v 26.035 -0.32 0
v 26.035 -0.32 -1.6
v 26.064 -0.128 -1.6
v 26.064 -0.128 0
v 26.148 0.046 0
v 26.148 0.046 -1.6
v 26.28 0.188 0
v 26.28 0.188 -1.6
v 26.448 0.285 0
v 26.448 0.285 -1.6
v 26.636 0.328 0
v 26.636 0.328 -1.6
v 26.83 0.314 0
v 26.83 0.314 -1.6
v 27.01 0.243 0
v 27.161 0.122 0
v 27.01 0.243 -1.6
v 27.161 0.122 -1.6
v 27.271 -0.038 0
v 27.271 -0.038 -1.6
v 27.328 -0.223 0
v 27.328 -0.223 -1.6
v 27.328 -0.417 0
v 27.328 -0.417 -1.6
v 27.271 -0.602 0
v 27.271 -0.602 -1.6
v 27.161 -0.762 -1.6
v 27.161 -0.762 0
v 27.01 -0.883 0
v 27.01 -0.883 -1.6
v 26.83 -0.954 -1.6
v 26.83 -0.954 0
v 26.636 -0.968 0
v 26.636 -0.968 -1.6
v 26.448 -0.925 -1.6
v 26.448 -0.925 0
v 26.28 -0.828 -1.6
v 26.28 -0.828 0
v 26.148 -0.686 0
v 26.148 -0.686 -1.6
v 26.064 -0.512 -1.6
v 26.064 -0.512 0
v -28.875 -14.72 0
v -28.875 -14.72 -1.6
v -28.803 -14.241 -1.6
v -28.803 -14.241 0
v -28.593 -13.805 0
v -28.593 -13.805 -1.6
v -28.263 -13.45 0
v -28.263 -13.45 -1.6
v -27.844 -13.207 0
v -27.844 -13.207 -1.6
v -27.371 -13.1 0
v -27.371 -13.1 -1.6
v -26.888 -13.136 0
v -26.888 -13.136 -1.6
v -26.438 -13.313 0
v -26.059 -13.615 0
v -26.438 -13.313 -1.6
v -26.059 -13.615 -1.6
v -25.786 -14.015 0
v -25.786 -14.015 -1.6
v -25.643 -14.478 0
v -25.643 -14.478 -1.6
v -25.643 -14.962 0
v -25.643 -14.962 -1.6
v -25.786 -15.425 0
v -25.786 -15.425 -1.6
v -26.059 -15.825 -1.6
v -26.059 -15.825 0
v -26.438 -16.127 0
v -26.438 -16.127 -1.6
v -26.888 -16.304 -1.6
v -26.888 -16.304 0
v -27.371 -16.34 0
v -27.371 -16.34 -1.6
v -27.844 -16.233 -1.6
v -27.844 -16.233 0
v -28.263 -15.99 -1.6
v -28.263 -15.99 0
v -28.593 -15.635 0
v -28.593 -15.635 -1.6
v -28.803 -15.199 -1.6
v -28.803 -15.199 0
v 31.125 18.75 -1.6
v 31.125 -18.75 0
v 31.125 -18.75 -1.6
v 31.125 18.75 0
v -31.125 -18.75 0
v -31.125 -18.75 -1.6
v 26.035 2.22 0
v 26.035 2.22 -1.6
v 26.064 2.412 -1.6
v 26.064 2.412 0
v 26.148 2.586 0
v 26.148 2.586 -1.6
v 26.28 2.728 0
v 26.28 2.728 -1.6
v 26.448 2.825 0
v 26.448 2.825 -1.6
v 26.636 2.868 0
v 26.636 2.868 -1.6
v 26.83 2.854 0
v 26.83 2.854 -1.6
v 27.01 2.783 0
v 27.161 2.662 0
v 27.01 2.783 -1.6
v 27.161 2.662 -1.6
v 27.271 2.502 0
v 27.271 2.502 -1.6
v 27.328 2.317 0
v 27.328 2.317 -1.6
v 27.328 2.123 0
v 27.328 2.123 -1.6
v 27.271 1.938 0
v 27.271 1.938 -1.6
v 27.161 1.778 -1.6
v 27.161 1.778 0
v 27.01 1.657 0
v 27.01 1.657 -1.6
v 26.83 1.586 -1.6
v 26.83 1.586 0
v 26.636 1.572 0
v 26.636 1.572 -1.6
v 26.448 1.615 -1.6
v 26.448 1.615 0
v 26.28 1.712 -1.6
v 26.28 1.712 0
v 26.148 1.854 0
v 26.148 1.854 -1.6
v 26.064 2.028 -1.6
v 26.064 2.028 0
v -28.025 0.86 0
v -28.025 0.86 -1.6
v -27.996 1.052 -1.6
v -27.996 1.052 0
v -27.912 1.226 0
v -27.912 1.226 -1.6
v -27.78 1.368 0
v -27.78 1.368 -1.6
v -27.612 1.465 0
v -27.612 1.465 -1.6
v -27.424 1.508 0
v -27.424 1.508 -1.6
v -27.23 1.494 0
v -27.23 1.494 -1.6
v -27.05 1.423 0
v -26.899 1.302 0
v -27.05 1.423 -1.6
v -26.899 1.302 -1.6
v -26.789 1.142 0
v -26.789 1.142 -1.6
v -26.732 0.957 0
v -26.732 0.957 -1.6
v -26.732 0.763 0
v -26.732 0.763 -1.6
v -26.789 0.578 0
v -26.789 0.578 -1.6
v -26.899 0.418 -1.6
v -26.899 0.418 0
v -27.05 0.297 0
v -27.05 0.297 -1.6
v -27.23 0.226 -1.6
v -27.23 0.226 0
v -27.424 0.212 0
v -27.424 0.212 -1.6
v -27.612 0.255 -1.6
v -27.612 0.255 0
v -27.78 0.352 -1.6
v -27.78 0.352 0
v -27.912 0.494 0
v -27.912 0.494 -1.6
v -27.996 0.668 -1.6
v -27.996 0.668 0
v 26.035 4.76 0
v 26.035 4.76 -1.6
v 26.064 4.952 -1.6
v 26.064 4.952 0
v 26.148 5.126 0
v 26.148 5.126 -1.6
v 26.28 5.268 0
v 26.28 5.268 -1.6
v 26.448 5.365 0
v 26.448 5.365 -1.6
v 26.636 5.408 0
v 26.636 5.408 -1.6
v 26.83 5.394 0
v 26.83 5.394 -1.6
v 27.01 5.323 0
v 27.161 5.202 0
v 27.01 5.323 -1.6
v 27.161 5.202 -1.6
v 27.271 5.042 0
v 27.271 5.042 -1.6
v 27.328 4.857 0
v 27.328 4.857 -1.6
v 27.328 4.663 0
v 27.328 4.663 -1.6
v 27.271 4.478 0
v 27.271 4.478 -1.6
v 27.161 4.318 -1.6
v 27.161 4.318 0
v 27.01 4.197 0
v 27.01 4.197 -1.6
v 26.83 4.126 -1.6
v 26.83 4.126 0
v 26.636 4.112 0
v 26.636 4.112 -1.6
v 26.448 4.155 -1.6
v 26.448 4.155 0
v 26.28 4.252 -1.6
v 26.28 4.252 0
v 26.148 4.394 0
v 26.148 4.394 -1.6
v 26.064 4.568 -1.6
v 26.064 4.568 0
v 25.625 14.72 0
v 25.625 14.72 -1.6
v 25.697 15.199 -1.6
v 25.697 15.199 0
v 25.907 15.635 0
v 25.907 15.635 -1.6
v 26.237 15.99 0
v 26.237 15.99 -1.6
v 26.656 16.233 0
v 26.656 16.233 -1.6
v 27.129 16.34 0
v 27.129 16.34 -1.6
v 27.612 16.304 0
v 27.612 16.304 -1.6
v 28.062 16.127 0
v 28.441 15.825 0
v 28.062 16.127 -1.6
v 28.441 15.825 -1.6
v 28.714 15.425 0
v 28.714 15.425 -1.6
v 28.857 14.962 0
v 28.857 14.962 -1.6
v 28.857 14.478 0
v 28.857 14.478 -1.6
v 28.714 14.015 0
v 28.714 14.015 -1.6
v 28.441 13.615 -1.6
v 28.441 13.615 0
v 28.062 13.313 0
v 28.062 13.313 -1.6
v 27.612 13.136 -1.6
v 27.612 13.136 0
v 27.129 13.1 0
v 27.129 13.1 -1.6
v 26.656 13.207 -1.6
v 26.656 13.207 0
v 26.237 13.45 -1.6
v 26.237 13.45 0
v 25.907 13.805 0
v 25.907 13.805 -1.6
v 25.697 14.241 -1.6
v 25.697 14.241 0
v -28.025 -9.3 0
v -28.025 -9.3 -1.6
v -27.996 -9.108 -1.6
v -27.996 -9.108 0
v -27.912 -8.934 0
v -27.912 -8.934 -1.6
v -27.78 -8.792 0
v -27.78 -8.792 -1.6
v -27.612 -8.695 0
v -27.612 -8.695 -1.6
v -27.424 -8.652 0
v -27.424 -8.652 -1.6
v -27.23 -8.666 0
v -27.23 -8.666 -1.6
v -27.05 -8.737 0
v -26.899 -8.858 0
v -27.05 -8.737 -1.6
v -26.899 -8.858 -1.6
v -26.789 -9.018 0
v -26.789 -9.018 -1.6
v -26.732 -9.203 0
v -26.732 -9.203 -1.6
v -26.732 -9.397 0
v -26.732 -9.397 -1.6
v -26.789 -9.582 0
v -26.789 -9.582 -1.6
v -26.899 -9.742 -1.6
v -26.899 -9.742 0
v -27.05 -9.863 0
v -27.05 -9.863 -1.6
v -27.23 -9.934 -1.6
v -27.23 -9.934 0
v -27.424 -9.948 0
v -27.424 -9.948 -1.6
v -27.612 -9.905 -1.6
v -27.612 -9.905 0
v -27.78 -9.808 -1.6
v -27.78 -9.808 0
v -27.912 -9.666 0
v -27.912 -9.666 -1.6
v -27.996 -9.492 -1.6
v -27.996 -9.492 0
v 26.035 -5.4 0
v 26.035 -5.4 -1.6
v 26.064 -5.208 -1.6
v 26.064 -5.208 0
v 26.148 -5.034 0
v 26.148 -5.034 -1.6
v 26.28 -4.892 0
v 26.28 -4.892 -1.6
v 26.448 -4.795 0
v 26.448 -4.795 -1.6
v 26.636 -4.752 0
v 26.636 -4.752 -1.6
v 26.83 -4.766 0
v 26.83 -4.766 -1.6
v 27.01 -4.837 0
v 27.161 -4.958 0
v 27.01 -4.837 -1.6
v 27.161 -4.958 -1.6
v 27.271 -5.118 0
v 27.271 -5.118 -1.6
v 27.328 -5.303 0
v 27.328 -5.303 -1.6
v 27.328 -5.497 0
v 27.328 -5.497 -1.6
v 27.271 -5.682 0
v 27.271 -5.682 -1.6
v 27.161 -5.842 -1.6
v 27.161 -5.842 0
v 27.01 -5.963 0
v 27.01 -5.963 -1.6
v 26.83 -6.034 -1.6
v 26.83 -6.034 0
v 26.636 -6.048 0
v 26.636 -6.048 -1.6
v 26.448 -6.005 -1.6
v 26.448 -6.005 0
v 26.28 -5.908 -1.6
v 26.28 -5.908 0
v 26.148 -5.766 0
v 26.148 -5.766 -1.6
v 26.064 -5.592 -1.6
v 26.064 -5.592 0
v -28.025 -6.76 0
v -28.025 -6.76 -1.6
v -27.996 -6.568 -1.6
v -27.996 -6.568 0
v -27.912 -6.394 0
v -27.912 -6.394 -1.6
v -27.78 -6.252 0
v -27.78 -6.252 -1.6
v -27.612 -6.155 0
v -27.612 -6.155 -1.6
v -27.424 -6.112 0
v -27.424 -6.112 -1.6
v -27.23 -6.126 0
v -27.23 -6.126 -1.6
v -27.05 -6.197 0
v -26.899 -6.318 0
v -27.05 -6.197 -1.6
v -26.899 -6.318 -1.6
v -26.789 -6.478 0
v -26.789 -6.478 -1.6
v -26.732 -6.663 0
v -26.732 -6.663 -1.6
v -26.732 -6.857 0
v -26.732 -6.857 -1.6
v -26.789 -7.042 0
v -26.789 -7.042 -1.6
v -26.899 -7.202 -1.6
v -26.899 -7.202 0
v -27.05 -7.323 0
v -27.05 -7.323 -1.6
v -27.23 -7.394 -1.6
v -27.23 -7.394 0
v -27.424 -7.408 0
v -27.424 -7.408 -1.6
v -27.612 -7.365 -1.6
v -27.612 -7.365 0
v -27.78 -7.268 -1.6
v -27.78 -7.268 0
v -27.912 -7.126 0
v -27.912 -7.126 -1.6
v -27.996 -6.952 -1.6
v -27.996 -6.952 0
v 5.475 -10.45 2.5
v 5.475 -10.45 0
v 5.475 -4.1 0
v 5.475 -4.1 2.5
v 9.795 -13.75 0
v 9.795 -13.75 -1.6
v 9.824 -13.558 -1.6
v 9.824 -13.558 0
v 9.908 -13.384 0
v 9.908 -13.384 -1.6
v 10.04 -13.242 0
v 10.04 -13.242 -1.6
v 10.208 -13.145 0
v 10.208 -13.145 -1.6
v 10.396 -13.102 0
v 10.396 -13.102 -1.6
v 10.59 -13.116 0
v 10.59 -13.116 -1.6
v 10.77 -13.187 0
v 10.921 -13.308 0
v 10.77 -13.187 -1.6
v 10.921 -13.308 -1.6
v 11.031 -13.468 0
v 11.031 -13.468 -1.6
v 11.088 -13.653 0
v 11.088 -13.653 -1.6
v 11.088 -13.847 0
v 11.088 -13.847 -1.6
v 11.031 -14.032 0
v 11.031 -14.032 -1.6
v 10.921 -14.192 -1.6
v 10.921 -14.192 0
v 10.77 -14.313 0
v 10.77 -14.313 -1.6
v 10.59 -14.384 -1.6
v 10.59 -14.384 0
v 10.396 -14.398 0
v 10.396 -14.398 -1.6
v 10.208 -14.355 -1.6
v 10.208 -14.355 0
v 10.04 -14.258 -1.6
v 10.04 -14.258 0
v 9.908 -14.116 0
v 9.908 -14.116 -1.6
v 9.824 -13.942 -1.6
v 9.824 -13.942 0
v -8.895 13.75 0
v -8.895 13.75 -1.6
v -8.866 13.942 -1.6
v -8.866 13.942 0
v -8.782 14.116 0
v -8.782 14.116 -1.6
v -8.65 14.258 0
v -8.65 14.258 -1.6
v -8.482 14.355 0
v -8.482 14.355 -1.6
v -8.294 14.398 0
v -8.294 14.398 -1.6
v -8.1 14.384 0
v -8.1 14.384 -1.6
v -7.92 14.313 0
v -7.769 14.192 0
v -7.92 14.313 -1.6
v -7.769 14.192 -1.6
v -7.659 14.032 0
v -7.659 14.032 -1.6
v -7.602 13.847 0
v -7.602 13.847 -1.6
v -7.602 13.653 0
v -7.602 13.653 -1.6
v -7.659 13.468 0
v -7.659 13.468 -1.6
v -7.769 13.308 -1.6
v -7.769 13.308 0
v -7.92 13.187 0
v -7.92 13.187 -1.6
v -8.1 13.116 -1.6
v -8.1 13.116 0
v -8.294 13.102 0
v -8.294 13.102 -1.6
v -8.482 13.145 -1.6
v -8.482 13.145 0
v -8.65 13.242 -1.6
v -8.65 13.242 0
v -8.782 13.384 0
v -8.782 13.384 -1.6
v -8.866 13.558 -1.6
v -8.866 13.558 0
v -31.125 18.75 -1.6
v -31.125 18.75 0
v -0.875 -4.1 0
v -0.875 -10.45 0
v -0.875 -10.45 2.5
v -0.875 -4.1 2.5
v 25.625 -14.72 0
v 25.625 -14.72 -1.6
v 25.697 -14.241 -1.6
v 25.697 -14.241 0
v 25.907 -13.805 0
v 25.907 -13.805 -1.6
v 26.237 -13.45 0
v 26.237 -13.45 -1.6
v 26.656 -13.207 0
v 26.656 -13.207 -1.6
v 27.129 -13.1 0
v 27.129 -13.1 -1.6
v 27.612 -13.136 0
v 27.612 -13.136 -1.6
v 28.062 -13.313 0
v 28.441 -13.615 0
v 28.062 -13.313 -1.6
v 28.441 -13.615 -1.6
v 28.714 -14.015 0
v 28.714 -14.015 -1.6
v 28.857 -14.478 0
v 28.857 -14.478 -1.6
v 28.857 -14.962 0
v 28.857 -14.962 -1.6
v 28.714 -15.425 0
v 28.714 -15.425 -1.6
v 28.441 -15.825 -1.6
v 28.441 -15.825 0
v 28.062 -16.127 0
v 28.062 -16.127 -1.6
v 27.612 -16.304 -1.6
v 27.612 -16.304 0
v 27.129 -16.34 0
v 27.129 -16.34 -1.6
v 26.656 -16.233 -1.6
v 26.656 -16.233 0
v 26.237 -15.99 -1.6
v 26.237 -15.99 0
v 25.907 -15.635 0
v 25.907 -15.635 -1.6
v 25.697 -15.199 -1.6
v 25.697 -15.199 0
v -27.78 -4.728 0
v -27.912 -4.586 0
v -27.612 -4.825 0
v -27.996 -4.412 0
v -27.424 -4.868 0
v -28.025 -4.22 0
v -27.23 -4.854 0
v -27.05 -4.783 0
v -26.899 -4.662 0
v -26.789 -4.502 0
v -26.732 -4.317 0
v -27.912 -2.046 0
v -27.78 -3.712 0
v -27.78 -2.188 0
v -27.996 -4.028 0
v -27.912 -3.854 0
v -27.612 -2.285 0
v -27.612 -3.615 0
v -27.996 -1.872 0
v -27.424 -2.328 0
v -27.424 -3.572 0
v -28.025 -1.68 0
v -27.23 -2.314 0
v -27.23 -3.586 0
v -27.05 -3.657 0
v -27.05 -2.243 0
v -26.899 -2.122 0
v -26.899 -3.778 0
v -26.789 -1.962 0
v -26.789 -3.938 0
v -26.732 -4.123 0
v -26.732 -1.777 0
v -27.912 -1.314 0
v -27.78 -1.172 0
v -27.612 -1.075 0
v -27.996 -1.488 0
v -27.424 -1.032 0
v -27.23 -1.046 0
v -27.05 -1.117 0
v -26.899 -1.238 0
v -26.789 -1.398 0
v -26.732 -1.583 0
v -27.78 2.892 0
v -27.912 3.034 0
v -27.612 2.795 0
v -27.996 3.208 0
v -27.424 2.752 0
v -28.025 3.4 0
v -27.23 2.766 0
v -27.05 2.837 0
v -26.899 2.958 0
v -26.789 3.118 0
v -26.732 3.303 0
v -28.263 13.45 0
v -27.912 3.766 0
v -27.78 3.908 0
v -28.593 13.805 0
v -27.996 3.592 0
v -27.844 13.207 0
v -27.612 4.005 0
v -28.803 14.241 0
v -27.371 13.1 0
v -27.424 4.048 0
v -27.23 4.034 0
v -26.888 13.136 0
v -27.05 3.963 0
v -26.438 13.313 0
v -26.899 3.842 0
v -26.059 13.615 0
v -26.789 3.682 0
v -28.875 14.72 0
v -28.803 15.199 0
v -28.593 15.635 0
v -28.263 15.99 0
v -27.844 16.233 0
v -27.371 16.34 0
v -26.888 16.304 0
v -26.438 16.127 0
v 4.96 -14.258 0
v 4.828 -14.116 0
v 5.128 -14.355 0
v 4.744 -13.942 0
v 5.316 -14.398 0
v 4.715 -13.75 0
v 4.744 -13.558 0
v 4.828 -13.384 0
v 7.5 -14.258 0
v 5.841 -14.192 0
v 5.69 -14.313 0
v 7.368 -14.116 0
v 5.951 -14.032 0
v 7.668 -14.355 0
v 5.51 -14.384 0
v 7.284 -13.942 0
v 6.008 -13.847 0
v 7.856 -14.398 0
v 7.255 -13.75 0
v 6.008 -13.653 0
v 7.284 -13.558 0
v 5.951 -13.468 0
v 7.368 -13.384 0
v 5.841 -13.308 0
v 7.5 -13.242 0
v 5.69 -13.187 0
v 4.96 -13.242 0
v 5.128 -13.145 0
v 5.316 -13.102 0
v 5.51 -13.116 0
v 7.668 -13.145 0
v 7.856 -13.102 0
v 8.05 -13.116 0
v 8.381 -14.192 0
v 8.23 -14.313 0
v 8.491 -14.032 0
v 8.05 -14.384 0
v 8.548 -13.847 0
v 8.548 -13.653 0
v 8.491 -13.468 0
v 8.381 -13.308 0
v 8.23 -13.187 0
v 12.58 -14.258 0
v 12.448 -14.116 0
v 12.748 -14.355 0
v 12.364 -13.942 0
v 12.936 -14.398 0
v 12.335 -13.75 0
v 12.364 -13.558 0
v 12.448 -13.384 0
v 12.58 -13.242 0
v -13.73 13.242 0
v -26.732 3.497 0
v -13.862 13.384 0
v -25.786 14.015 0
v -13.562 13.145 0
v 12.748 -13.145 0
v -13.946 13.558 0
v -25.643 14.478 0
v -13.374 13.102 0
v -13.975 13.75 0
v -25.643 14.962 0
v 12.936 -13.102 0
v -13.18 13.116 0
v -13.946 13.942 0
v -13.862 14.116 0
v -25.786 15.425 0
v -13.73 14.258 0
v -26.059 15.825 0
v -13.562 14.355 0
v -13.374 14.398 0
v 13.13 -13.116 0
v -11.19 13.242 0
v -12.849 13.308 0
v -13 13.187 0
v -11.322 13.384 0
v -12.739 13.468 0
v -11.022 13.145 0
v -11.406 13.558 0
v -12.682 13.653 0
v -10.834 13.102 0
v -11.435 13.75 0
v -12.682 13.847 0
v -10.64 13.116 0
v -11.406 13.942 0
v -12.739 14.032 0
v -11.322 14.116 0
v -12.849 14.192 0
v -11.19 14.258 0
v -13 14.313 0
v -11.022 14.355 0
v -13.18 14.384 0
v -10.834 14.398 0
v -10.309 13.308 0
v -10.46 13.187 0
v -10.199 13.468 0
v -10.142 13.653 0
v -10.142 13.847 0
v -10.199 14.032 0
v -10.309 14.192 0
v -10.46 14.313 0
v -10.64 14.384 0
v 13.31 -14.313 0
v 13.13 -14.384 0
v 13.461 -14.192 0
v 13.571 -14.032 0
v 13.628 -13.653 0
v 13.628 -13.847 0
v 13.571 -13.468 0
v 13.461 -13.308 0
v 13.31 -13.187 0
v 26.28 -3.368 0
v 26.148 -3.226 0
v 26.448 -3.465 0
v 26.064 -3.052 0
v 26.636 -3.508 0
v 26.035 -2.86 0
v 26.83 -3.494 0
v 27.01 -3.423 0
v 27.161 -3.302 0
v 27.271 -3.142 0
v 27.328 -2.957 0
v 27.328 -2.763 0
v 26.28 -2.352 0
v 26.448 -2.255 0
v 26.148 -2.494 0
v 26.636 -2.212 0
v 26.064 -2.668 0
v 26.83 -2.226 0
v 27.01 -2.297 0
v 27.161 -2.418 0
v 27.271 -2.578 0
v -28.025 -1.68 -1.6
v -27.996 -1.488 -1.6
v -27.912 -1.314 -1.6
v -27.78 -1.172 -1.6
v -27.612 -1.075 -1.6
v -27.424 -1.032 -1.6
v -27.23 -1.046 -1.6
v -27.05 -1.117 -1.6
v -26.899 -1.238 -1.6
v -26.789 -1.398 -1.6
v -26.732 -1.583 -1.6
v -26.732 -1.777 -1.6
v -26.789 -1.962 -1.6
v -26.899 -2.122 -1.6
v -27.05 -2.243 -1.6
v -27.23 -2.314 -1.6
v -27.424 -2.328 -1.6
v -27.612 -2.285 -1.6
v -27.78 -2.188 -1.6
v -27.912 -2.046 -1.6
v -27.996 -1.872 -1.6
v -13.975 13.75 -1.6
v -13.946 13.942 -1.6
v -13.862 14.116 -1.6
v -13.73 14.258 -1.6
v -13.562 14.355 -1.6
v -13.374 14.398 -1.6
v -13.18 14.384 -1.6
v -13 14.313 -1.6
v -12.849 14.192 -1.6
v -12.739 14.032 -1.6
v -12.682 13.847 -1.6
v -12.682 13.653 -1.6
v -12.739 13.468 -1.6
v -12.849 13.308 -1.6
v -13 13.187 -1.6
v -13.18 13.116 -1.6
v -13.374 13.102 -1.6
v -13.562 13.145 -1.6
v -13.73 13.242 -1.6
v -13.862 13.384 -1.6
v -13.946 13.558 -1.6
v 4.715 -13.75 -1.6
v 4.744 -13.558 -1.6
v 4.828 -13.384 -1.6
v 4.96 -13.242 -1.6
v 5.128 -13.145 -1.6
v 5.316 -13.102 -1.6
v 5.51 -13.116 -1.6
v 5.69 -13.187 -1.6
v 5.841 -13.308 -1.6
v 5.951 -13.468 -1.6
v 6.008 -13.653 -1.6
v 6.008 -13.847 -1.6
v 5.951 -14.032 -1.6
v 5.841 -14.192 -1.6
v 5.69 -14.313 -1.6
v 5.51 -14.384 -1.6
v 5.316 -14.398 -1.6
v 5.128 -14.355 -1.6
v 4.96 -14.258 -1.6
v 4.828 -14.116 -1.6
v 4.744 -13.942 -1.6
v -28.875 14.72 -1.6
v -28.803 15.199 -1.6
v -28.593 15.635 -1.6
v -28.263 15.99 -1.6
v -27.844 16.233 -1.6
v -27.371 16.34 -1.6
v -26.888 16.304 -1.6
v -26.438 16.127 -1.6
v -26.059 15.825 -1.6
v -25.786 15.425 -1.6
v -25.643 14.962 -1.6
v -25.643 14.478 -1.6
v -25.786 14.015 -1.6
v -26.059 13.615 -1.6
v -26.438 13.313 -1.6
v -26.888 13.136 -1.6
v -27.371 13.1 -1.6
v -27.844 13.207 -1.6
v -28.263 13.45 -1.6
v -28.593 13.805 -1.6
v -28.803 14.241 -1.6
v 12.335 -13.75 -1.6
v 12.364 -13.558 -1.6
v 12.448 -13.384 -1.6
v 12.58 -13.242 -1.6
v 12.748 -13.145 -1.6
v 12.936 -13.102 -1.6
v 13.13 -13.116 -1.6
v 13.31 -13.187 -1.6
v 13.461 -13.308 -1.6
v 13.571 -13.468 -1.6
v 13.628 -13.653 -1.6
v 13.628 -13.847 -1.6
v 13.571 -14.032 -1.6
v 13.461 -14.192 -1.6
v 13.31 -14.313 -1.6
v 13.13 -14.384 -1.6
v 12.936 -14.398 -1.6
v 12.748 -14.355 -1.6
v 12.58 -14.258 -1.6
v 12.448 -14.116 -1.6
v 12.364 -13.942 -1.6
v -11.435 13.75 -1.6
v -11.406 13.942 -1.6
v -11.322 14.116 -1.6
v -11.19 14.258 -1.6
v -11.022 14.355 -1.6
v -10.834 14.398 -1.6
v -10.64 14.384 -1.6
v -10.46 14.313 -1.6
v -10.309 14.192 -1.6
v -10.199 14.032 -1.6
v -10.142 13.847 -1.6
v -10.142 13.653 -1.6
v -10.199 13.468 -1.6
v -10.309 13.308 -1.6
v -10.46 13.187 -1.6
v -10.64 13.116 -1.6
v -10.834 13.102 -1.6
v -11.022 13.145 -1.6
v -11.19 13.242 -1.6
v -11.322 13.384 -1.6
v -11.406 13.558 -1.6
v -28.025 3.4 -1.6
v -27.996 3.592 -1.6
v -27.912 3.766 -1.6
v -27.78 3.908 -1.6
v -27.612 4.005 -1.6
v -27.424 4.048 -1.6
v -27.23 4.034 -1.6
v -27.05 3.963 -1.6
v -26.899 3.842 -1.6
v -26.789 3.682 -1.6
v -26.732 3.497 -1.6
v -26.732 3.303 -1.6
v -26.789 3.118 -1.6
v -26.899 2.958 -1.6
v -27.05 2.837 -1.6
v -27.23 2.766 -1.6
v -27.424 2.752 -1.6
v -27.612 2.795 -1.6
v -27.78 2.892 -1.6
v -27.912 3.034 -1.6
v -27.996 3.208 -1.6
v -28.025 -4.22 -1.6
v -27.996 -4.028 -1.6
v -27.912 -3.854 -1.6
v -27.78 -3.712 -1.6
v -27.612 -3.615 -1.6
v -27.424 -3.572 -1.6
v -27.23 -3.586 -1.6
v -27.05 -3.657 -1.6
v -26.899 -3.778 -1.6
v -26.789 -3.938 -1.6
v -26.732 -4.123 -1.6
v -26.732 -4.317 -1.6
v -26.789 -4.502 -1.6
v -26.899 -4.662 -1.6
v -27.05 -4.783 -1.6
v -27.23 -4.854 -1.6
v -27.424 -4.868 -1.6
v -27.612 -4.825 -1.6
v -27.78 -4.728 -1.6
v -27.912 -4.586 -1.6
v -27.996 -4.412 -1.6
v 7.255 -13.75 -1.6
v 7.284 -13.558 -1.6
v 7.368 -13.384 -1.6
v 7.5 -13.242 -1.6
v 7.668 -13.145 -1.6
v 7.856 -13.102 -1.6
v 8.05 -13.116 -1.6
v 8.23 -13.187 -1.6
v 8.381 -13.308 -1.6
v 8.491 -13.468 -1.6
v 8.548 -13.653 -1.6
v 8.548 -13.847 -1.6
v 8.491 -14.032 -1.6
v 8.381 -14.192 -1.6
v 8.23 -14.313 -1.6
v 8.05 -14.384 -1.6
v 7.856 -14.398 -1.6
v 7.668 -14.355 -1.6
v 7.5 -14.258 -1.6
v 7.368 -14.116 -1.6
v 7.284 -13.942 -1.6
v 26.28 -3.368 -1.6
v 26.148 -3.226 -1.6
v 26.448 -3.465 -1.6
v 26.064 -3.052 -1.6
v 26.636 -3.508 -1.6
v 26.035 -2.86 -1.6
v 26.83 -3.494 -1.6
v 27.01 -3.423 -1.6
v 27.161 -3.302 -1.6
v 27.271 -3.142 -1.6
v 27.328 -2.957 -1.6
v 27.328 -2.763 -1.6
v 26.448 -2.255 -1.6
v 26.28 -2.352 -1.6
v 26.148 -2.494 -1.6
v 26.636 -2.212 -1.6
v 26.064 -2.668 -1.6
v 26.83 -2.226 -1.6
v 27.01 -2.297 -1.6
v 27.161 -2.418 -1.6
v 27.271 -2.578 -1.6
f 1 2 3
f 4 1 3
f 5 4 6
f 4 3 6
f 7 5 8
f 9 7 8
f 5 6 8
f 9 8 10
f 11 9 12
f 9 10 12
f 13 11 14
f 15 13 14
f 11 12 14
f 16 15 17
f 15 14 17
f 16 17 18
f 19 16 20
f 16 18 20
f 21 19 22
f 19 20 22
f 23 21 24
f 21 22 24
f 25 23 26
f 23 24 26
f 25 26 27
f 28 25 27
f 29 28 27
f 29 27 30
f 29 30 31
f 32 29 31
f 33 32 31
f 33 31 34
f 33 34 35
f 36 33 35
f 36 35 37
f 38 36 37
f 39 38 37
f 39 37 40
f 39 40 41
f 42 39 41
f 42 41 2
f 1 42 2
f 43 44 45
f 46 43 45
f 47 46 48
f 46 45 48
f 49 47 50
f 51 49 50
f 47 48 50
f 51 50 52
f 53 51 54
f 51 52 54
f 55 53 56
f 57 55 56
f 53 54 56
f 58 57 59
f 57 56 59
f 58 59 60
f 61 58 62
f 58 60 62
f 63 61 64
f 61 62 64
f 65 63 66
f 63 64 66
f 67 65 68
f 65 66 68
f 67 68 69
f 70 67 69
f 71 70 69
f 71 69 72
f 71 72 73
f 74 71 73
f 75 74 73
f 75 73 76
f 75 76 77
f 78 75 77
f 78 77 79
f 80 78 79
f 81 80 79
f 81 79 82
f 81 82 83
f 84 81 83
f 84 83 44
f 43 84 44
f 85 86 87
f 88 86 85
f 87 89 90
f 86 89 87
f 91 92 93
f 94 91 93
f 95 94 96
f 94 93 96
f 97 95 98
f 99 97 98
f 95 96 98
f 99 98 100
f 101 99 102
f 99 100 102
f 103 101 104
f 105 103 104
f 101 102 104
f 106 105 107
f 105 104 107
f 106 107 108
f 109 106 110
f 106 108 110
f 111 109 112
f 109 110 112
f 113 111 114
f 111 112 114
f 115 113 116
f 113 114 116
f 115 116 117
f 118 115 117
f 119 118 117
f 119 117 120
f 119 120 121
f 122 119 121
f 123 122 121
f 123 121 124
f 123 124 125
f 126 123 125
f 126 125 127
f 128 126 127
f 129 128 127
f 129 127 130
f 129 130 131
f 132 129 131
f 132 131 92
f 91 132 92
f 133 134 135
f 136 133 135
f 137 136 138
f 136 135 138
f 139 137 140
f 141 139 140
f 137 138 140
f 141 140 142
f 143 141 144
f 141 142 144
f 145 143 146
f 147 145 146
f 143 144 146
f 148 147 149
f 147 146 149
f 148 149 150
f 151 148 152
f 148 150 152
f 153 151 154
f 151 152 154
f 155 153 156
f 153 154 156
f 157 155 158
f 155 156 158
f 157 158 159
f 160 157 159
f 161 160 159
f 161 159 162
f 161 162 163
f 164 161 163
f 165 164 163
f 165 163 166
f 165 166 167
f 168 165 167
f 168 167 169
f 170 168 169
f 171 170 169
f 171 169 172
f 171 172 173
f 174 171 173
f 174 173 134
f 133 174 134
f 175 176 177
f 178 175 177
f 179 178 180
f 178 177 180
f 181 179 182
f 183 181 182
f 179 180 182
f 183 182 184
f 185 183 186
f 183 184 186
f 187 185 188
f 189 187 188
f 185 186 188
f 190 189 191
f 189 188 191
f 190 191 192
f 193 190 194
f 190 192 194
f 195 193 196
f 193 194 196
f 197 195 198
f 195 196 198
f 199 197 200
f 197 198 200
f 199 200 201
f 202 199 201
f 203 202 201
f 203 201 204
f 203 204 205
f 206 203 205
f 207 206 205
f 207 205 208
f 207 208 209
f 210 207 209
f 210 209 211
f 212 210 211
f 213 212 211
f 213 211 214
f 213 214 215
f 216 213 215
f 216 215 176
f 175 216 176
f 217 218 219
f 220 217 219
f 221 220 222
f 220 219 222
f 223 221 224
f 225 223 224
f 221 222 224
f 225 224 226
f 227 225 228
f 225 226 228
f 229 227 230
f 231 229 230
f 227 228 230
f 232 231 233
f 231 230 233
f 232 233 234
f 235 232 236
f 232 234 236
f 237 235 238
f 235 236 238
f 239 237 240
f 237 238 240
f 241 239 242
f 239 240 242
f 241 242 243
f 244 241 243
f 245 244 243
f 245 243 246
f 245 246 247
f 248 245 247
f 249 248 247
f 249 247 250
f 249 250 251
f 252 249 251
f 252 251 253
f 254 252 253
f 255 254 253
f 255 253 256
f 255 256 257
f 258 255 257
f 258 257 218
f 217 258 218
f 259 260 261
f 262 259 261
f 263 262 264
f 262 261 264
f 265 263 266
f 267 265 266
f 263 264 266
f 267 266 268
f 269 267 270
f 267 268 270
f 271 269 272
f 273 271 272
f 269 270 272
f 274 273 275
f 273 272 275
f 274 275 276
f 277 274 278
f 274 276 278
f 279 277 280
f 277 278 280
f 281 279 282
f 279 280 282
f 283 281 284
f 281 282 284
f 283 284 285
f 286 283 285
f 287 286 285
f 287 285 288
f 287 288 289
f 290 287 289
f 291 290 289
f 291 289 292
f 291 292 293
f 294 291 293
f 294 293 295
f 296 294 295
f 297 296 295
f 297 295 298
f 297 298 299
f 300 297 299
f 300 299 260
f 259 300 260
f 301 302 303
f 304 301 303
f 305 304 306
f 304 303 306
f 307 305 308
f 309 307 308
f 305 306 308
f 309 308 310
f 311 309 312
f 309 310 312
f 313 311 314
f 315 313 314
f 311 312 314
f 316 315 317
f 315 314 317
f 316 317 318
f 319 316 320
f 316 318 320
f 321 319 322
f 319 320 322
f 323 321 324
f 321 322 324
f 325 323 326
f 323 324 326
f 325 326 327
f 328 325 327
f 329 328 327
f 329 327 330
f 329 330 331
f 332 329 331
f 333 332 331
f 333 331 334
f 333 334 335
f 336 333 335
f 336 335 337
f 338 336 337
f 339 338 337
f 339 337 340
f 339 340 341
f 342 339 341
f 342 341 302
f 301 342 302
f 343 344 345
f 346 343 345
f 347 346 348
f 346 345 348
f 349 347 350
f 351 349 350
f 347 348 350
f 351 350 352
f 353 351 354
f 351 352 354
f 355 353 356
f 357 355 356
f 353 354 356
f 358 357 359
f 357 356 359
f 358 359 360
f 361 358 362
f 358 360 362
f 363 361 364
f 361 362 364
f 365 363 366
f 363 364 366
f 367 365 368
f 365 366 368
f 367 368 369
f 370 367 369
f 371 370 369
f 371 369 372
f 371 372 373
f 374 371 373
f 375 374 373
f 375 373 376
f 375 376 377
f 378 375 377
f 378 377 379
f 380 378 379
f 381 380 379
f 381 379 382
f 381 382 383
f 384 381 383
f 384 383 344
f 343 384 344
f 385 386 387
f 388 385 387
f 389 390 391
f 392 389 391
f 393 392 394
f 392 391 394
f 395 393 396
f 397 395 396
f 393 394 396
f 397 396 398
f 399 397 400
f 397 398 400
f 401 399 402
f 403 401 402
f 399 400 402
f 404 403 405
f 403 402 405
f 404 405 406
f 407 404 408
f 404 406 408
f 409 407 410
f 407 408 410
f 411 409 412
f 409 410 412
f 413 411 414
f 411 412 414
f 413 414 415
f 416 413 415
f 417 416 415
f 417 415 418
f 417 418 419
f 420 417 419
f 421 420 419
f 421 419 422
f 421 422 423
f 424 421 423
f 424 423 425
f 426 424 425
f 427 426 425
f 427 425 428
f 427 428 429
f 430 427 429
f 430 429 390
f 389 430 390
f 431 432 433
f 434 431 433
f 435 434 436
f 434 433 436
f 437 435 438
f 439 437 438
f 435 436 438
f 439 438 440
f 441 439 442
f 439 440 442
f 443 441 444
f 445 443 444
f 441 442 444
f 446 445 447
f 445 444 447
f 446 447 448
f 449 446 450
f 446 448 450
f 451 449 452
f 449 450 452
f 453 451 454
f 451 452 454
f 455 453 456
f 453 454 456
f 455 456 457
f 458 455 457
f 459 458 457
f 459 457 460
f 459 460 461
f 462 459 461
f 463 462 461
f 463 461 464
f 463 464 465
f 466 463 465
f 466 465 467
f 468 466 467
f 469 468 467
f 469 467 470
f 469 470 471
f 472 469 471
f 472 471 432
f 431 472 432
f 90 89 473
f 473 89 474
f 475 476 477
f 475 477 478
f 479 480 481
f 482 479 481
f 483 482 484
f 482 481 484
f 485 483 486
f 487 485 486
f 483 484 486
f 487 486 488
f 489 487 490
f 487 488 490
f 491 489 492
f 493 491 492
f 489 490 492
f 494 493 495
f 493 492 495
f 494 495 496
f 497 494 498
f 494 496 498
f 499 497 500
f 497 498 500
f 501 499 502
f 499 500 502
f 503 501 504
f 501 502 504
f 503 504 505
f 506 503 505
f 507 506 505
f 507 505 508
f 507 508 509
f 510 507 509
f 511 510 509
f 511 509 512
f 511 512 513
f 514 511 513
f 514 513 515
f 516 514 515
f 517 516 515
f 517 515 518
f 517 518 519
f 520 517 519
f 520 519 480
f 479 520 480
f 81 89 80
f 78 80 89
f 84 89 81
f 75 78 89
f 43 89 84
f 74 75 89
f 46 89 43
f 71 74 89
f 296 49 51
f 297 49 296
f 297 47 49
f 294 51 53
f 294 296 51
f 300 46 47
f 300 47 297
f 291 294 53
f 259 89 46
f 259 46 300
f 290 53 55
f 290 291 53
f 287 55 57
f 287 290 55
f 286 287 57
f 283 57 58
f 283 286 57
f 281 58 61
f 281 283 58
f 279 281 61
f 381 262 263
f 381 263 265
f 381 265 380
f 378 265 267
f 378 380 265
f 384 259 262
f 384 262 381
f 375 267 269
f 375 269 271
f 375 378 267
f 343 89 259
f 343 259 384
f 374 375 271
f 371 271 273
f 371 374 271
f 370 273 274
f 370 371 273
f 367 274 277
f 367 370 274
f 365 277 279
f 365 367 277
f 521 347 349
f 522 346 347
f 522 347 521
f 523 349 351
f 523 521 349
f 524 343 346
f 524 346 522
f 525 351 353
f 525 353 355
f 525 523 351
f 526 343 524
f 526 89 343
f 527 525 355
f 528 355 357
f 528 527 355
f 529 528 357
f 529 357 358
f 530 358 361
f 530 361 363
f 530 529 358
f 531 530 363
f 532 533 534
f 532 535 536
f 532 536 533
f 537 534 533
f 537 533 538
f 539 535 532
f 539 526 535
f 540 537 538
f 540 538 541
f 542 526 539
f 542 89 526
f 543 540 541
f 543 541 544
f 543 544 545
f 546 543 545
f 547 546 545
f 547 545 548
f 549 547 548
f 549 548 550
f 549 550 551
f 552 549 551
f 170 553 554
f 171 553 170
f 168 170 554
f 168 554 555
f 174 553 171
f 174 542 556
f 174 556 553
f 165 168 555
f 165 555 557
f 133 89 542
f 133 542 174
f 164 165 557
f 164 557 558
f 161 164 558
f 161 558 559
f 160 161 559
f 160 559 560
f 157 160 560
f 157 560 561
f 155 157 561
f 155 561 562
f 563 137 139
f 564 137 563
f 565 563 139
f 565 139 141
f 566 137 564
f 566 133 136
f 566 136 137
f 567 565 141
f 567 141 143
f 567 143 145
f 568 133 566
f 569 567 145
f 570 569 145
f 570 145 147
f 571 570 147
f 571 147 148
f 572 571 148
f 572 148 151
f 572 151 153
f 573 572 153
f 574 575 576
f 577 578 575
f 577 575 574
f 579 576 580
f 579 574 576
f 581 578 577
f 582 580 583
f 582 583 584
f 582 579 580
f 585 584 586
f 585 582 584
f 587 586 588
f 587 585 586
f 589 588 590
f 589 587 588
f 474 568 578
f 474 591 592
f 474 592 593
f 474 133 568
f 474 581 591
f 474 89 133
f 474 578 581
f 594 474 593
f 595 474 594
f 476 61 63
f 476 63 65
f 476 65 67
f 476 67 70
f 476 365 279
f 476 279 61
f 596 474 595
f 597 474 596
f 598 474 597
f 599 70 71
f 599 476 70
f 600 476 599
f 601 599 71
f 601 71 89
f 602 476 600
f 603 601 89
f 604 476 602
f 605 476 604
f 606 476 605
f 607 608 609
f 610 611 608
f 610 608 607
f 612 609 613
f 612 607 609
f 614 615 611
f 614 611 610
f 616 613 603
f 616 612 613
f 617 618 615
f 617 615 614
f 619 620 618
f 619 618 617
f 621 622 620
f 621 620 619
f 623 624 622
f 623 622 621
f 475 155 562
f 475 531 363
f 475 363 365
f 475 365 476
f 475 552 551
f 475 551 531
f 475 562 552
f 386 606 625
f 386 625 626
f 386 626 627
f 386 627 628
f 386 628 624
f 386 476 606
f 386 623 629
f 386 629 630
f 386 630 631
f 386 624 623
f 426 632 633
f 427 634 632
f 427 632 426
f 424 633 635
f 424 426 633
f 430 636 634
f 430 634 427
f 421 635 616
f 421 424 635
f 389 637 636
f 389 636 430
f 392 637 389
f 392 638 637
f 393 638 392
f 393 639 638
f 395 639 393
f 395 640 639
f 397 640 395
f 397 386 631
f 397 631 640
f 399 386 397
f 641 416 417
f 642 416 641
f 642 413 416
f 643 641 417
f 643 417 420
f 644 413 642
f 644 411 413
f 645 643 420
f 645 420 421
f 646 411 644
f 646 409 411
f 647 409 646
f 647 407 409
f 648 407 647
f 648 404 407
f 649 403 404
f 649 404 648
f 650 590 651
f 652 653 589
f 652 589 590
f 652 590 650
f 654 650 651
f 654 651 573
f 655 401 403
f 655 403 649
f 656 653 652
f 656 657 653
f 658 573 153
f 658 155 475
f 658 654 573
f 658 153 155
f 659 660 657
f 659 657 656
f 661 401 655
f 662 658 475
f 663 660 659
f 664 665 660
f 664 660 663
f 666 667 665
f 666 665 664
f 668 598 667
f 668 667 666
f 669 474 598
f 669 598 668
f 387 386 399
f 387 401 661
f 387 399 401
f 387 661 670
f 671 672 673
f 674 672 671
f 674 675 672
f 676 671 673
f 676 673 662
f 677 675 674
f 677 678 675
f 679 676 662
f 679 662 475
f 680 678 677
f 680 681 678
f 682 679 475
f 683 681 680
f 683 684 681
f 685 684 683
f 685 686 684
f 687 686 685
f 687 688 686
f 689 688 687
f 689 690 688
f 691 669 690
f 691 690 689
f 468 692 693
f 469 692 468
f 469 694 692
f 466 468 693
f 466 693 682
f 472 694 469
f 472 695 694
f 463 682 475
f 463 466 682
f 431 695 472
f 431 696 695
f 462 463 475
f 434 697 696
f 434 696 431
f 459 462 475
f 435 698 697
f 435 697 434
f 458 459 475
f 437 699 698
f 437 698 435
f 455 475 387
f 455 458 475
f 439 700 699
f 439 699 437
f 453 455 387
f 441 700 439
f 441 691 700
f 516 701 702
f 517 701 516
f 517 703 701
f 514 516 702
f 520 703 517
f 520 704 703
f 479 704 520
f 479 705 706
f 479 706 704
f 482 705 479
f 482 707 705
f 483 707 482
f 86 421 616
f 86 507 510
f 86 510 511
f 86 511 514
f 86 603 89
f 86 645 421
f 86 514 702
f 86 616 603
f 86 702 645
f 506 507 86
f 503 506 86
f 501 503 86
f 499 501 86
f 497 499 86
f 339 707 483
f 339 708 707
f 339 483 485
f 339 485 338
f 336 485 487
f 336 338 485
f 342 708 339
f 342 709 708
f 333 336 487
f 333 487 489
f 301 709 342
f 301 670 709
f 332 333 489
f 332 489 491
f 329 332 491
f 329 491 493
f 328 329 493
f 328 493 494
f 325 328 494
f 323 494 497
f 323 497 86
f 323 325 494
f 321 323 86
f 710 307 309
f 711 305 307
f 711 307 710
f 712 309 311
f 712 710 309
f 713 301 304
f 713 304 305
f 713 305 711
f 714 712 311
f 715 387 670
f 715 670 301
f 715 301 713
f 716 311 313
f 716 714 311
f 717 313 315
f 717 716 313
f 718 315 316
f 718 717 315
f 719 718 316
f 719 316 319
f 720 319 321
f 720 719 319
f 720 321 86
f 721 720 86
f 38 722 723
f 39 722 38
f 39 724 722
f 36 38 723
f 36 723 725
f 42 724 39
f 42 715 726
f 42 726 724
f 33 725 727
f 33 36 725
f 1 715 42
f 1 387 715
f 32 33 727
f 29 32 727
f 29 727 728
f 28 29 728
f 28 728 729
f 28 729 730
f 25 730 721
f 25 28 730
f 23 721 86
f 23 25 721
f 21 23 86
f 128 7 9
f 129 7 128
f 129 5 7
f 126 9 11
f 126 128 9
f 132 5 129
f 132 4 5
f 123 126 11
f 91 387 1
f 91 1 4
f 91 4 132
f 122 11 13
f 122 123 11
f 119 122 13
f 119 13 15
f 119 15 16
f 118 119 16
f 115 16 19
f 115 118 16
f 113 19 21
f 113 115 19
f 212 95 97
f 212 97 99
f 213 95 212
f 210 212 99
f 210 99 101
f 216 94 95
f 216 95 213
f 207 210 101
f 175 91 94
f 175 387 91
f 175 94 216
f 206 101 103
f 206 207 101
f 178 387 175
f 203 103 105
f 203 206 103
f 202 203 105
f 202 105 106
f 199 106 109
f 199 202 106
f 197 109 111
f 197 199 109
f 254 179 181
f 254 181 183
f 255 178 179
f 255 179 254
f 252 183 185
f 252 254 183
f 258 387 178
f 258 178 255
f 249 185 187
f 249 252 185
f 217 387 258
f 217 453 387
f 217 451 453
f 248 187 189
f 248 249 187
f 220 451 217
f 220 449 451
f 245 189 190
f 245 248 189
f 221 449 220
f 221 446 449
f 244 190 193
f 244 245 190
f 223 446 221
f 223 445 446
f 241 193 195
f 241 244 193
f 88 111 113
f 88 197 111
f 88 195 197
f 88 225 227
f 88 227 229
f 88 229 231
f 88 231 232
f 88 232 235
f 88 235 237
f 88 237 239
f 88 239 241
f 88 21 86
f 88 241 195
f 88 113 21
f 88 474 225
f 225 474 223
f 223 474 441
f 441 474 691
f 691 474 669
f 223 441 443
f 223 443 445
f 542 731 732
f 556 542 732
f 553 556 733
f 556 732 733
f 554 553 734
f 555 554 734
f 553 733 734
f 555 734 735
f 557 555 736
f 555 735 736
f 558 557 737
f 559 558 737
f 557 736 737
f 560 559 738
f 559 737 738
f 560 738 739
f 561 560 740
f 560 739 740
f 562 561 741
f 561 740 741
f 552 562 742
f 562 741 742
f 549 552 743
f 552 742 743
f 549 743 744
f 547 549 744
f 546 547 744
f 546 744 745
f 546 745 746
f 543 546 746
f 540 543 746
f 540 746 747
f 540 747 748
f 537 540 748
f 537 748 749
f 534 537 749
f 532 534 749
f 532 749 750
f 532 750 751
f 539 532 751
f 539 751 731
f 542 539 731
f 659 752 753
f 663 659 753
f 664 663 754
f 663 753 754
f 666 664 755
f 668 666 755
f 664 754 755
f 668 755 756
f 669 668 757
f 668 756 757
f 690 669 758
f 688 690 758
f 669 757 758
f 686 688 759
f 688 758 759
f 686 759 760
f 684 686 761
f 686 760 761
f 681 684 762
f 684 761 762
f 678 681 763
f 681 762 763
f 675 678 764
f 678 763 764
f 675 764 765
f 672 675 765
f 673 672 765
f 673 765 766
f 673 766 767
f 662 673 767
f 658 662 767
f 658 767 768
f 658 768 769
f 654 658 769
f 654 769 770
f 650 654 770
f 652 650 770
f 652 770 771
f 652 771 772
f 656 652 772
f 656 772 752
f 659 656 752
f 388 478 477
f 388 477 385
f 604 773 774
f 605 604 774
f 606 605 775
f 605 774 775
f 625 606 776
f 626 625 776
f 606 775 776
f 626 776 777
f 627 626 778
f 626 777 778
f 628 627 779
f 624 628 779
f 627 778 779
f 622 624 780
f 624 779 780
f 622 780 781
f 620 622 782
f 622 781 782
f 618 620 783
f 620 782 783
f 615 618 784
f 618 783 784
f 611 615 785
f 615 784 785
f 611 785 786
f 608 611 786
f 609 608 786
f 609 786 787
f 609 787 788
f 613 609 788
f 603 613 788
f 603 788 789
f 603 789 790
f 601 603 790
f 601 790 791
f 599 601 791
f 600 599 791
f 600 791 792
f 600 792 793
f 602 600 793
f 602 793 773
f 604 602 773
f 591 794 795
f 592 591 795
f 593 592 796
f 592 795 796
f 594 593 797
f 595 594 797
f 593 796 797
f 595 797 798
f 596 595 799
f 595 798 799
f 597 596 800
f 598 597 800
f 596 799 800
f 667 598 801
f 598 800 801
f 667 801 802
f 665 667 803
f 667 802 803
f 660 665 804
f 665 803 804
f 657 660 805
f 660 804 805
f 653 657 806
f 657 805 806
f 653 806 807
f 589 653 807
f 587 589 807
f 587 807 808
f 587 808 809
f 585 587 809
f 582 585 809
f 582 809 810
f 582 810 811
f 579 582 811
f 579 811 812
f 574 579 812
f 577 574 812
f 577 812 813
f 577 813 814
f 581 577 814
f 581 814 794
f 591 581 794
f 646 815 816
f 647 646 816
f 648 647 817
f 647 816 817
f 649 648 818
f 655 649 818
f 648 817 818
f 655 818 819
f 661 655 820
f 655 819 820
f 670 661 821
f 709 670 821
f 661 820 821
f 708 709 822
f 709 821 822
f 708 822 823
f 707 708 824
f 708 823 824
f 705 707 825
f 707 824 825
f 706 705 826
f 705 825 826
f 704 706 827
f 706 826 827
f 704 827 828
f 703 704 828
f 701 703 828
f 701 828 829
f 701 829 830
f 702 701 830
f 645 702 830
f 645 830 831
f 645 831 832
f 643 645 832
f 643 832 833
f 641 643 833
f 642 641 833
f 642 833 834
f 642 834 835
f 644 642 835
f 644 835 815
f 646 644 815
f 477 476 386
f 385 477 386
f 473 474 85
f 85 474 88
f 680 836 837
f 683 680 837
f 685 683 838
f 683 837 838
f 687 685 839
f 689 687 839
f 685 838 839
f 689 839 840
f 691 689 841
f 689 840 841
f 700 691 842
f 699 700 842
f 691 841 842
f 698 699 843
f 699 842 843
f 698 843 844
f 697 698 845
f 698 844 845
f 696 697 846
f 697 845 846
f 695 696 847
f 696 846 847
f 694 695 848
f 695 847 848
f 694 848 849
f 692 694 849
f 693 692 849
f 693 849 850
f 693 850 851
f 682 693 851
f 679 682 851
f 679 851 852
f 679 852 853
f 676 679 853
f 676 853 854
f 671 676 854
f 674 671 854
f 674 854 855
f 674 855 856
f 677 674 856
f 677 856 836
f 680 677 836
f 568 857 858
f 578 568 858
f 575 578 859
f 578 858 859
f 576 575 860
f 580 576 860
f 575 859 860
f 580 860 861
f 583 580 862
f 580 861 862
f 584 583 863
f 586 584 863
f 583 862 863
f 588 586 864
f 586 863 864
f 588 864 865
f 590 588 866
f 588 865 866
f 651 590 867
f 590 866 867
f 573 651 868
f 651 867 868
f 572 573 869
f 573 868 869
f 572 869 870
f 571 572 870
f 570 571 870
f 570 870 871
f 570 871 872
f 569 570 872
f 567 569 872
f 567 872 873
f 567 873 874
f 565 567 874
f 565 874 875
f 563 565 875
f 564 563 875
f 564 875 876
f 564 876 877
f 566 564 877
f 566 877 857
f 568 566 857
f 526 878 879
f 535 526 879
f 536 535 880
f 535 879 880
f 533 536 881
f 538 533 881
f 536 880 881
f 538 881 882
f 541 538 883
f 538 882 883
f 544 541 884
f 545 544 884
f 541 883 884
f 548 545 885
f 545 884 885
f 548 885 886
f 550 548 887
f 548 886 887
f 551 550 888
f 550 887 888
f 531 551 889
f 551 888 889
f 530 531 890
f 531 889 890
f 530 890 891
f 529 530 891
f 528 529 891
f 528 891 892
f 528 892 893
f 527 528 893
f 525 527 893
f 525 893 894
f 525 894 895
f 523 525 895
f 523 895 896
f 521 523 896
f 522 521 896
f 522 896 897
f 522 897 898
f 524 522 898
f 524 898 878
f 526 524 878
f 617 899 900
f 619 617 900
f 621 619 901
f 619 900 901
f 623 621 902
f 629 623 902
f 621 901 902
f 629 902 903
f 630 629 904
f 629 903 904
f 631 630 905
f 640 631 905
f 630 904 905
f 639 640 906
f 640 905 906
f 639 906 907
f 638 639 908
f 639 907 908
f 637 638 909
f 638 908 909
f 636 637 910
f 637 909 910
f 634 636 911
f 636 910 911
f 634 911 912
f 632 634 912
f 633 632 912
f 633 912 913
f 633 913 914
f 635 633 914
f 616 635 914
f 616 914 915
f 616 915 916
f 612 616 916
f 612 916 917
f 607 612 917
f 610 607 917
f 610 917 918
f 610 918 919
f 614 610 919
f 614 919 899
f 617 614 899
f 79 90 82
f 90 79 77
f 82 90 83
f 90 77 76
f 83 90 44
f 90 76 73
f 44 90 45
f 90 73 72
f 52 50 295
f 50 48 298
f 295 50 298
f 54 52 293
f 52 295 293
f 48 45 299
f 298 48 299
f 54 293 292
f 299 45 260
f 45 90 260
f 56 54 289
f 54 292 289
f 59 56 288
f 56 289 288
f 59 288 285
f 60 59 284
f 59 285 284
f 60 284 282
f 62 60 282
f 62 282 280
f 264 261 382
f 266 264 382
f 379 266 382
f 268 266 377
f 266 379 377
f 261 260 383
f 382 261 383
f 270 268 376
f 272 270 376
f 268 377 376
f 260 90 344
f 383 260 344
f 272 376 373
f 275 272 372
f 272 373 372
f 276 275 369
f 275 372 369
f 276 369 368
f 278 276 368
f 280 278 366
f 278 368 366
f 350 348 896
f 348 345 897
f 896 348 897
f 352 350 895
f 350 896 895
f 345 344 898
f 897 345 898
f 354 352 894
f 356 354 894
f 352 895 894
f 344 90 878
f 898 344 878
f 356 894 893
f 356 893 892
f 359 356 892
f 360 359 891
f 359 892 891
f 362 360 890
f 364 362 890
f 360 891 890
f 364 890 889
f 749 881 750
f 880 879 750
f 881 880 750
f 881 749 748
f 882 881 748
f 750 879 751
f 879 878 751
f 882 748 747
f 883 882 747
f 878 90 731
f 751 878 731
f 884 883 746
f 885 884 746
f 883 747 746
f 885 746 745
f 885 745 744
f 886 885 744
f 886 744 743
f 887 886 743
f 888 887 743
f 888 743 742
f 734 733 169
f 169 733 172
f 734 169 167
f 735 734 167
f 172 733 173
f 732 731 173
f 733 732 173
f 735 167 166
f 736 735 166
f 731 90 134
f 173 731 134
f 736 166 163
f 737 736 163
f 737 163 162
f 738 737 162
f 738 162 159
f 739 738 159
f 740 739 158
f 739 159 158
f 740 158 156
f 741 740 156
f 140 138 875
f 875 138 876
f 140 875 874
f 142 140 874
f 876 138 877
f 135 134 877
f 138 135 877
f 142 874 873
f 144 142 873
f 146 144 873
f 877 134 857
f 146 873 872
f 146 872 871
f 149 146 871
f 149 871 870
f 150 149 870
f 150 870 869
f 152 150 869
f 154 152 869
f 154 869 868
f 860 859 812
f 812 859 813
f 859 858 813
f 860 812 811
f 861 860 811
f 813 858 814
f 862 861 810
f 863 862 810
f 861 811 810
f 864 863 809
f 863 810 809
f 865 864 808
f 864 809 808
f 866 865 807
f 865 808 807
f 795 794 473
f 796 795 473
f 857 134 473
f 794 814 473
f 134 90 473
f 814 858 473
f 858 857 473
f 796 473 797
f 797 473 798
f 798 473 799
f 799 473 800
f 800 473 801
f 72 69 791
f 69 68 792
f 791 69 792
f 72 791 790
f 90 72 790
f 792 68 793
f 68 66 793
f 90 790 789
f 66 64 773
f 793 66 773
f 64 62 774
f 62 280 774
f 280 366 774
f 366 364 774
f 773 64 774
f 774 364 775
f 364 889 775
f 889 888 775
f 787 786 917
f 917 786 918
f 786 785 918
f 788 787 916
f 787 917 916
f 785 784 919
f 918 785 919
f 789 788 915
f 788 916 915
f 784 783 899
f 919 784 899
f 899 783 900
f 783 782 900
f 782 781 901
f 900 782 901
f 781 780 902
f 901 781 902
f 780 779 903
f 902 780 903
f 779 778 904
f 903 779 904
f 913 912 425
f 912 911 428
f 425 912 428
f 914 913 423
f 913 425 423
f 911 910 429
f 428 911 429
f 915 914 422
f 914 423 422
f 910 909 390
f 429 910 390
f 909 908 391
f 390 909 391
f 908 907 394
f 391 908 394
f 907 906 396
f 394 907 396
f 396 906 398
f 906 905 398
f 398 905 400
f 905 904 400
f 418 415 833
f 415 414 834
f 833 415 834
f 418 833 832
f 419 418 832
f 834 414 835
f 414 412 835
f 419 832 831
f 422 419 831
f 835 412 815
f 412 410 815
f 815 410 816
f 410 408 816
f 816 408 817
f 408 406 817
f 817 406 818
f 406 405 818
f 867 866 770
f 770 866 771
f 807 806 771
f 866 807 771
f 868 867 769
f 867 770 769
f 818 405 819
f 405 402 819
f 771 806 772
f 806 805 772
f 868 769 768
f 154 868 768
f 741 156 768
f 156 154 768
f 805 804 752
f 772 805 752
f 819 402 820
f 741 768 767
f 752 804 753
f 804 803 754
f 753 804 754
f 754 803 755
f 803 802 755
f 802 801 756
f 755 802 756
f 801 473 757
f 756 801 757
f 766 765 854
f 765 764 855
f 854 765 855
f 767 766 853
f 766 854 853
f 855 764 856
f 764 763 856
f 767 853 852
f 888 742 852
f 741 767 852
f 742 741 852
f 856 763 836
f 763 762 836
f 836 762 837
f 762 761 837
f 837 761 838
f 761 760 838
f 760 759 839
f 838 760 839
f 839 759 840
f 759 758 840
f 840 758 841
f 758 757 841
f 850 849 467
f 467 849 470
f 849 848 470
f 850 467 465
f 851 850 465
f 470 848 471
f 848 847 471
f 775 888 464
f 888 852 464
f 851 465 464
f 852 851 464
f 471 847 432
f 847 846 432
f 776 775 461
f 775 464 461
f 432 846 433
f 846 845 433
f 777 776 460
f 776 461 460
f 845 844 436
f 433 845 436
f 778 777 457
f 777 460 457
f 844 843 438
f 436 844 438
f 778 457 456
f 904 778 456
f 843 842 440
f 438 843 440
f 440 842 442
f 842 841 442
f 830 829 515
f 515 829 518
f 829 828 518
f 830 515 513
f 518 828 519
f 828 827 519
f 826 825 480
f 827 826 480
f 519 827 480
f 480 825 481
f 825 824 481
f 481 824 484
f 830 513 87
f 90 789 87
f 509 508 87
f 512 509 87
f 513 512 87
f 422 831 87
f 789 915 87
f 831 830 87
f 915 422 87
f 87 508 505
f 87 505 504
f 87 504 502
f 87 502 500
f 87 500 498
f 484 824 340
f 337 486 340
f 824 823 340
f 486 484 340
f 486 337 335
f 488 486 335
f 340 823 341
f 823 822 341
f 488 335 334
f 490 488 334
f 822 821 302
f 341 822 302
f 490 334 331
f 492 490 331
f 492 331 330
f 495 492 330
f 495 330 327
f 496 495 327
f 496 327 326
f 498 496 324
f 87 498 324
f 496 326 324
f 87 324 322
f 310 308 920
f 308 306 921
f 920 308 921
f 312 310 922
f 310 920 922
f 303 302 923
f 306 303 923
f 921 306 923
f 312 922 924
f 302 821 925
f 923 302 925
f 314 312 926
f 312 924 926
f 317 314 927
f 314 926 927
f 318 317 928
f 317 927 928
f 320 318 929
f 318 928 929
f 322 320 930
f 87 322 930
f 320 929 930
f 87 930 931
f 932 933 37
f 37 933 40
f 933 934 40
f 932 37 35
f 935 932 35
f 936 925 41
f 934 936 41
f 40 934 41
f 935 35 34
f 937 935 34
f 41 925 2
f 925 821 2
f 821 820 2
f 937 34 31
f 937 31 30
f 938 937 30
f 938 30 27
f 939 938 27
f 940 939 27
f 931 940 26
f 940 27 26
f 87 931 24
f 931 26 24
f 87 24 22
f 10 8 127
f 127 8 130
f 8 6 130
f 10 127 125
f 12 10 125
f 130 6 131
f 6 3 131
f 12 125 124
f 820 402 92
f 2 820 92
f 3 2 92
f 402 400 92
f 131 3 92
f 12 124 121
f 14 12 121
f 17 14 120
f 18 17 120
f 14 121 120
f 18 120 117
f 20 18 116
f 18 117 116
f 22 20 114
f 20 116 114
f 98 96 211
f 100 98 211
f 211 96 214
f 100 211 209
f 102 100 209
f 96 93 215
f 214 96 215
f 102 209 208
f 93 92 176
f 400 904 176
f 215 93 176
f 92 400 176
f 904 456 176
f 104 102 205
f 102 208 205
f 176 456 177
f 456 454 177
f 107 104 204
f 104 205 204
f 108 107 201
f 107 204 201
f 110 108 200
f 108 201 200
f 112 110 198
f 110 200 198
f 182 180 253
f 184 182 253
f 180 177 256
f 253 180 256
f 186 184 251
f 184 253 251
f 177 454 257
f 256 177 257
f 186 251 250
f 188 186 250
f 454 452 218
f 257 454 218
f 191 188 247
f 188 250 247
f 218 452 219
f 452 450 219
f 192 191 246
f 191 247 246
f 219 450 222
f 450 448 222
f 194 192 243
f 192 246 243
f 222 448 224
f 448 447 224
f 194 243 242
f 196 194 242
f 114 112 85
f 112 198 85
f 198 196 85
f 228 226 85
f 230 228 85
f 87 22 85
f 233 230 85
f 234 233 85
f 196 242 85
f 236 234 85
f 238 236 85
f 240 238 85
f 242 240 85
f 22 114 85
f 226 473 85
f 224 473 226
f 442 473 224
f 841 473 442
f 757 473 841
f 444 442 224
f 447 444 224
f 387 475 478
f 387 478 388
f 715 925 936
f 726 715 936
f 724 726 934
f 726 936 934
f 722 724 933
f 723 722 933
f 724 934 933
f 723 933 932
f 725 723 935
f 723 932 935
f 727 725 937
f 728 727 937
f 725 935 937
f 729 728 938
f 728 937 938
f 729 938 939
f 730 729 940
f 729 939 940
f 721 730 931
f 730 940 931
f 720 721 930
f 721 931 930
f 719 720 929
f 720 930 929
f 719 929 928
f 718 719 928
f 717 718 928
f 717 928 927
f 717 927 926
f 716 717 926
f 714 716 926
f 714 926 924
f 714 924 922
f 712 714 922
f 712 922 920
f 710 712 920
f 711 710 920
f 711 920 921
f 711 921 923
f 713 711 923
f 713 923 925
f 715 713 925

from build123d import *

# Parameters (mm, degrees)
F0_W     = 62.25
F0_H     = 37.5
F0_W_2   = 6.35
F0_H_2   = 6.35
F1_DEPTH = 1.6
F2_DEPTH = 2.5
F3_D     = 1.3
F4_D     = 3.25


with BuildPart() as f1:
    # F0 (on Top) → F1 (new body)
    with BuildSketch(Plane.XY):
        Rectangle(F0_W, F0_H)
        with Locations((2.3, -7.275)):
            Rectangle(F0_W_2, F0_H_2, mode=Mode.SUBTRACT)
        with Locations((2.3, -7.275)):
            Rectangle(F0_W_2, F0_H_2)
    extrude(amount=-F1_DEPTH)

    # F0 (on Top) → F2 (join)
    with BuildSketch(Plane.XY):
        with Locations((2.3, -7.275)):
            Rectangle(F0_W_2, F0_H_2)
    extrude(amount=F2_DEPTH)

    # F3 (through all)
    with Locations(Plane.XY):
        with Locations((-13.325, 13.75), (-10.785, 13.75), (-8.245, 13.75), (-27.375, 3.4), (-27.375, 0.86), (-27.375, -1.68), (-27.375, -4.22), (-27.375, -6.76), (-27.375, -9.3), (5.365, -13.75), (7.905, -13.75), (10.445, -13.75), (12.985, -13.75), (26.685, -5.4), (26.685, -2.86), (26.685, -0.32), (26.685, 2.22), (26.685, 4.76)):
            Hole(F3_D / 2)

    # F4 (through all)
    with Locations(Plane.XY):
        with Locations((-27.25, 14.72), (-27.25, -14.72), (27.25, -14.72), (27.25, 14.72)):
            Hole(F4_D / 2)


solid = f1.part
